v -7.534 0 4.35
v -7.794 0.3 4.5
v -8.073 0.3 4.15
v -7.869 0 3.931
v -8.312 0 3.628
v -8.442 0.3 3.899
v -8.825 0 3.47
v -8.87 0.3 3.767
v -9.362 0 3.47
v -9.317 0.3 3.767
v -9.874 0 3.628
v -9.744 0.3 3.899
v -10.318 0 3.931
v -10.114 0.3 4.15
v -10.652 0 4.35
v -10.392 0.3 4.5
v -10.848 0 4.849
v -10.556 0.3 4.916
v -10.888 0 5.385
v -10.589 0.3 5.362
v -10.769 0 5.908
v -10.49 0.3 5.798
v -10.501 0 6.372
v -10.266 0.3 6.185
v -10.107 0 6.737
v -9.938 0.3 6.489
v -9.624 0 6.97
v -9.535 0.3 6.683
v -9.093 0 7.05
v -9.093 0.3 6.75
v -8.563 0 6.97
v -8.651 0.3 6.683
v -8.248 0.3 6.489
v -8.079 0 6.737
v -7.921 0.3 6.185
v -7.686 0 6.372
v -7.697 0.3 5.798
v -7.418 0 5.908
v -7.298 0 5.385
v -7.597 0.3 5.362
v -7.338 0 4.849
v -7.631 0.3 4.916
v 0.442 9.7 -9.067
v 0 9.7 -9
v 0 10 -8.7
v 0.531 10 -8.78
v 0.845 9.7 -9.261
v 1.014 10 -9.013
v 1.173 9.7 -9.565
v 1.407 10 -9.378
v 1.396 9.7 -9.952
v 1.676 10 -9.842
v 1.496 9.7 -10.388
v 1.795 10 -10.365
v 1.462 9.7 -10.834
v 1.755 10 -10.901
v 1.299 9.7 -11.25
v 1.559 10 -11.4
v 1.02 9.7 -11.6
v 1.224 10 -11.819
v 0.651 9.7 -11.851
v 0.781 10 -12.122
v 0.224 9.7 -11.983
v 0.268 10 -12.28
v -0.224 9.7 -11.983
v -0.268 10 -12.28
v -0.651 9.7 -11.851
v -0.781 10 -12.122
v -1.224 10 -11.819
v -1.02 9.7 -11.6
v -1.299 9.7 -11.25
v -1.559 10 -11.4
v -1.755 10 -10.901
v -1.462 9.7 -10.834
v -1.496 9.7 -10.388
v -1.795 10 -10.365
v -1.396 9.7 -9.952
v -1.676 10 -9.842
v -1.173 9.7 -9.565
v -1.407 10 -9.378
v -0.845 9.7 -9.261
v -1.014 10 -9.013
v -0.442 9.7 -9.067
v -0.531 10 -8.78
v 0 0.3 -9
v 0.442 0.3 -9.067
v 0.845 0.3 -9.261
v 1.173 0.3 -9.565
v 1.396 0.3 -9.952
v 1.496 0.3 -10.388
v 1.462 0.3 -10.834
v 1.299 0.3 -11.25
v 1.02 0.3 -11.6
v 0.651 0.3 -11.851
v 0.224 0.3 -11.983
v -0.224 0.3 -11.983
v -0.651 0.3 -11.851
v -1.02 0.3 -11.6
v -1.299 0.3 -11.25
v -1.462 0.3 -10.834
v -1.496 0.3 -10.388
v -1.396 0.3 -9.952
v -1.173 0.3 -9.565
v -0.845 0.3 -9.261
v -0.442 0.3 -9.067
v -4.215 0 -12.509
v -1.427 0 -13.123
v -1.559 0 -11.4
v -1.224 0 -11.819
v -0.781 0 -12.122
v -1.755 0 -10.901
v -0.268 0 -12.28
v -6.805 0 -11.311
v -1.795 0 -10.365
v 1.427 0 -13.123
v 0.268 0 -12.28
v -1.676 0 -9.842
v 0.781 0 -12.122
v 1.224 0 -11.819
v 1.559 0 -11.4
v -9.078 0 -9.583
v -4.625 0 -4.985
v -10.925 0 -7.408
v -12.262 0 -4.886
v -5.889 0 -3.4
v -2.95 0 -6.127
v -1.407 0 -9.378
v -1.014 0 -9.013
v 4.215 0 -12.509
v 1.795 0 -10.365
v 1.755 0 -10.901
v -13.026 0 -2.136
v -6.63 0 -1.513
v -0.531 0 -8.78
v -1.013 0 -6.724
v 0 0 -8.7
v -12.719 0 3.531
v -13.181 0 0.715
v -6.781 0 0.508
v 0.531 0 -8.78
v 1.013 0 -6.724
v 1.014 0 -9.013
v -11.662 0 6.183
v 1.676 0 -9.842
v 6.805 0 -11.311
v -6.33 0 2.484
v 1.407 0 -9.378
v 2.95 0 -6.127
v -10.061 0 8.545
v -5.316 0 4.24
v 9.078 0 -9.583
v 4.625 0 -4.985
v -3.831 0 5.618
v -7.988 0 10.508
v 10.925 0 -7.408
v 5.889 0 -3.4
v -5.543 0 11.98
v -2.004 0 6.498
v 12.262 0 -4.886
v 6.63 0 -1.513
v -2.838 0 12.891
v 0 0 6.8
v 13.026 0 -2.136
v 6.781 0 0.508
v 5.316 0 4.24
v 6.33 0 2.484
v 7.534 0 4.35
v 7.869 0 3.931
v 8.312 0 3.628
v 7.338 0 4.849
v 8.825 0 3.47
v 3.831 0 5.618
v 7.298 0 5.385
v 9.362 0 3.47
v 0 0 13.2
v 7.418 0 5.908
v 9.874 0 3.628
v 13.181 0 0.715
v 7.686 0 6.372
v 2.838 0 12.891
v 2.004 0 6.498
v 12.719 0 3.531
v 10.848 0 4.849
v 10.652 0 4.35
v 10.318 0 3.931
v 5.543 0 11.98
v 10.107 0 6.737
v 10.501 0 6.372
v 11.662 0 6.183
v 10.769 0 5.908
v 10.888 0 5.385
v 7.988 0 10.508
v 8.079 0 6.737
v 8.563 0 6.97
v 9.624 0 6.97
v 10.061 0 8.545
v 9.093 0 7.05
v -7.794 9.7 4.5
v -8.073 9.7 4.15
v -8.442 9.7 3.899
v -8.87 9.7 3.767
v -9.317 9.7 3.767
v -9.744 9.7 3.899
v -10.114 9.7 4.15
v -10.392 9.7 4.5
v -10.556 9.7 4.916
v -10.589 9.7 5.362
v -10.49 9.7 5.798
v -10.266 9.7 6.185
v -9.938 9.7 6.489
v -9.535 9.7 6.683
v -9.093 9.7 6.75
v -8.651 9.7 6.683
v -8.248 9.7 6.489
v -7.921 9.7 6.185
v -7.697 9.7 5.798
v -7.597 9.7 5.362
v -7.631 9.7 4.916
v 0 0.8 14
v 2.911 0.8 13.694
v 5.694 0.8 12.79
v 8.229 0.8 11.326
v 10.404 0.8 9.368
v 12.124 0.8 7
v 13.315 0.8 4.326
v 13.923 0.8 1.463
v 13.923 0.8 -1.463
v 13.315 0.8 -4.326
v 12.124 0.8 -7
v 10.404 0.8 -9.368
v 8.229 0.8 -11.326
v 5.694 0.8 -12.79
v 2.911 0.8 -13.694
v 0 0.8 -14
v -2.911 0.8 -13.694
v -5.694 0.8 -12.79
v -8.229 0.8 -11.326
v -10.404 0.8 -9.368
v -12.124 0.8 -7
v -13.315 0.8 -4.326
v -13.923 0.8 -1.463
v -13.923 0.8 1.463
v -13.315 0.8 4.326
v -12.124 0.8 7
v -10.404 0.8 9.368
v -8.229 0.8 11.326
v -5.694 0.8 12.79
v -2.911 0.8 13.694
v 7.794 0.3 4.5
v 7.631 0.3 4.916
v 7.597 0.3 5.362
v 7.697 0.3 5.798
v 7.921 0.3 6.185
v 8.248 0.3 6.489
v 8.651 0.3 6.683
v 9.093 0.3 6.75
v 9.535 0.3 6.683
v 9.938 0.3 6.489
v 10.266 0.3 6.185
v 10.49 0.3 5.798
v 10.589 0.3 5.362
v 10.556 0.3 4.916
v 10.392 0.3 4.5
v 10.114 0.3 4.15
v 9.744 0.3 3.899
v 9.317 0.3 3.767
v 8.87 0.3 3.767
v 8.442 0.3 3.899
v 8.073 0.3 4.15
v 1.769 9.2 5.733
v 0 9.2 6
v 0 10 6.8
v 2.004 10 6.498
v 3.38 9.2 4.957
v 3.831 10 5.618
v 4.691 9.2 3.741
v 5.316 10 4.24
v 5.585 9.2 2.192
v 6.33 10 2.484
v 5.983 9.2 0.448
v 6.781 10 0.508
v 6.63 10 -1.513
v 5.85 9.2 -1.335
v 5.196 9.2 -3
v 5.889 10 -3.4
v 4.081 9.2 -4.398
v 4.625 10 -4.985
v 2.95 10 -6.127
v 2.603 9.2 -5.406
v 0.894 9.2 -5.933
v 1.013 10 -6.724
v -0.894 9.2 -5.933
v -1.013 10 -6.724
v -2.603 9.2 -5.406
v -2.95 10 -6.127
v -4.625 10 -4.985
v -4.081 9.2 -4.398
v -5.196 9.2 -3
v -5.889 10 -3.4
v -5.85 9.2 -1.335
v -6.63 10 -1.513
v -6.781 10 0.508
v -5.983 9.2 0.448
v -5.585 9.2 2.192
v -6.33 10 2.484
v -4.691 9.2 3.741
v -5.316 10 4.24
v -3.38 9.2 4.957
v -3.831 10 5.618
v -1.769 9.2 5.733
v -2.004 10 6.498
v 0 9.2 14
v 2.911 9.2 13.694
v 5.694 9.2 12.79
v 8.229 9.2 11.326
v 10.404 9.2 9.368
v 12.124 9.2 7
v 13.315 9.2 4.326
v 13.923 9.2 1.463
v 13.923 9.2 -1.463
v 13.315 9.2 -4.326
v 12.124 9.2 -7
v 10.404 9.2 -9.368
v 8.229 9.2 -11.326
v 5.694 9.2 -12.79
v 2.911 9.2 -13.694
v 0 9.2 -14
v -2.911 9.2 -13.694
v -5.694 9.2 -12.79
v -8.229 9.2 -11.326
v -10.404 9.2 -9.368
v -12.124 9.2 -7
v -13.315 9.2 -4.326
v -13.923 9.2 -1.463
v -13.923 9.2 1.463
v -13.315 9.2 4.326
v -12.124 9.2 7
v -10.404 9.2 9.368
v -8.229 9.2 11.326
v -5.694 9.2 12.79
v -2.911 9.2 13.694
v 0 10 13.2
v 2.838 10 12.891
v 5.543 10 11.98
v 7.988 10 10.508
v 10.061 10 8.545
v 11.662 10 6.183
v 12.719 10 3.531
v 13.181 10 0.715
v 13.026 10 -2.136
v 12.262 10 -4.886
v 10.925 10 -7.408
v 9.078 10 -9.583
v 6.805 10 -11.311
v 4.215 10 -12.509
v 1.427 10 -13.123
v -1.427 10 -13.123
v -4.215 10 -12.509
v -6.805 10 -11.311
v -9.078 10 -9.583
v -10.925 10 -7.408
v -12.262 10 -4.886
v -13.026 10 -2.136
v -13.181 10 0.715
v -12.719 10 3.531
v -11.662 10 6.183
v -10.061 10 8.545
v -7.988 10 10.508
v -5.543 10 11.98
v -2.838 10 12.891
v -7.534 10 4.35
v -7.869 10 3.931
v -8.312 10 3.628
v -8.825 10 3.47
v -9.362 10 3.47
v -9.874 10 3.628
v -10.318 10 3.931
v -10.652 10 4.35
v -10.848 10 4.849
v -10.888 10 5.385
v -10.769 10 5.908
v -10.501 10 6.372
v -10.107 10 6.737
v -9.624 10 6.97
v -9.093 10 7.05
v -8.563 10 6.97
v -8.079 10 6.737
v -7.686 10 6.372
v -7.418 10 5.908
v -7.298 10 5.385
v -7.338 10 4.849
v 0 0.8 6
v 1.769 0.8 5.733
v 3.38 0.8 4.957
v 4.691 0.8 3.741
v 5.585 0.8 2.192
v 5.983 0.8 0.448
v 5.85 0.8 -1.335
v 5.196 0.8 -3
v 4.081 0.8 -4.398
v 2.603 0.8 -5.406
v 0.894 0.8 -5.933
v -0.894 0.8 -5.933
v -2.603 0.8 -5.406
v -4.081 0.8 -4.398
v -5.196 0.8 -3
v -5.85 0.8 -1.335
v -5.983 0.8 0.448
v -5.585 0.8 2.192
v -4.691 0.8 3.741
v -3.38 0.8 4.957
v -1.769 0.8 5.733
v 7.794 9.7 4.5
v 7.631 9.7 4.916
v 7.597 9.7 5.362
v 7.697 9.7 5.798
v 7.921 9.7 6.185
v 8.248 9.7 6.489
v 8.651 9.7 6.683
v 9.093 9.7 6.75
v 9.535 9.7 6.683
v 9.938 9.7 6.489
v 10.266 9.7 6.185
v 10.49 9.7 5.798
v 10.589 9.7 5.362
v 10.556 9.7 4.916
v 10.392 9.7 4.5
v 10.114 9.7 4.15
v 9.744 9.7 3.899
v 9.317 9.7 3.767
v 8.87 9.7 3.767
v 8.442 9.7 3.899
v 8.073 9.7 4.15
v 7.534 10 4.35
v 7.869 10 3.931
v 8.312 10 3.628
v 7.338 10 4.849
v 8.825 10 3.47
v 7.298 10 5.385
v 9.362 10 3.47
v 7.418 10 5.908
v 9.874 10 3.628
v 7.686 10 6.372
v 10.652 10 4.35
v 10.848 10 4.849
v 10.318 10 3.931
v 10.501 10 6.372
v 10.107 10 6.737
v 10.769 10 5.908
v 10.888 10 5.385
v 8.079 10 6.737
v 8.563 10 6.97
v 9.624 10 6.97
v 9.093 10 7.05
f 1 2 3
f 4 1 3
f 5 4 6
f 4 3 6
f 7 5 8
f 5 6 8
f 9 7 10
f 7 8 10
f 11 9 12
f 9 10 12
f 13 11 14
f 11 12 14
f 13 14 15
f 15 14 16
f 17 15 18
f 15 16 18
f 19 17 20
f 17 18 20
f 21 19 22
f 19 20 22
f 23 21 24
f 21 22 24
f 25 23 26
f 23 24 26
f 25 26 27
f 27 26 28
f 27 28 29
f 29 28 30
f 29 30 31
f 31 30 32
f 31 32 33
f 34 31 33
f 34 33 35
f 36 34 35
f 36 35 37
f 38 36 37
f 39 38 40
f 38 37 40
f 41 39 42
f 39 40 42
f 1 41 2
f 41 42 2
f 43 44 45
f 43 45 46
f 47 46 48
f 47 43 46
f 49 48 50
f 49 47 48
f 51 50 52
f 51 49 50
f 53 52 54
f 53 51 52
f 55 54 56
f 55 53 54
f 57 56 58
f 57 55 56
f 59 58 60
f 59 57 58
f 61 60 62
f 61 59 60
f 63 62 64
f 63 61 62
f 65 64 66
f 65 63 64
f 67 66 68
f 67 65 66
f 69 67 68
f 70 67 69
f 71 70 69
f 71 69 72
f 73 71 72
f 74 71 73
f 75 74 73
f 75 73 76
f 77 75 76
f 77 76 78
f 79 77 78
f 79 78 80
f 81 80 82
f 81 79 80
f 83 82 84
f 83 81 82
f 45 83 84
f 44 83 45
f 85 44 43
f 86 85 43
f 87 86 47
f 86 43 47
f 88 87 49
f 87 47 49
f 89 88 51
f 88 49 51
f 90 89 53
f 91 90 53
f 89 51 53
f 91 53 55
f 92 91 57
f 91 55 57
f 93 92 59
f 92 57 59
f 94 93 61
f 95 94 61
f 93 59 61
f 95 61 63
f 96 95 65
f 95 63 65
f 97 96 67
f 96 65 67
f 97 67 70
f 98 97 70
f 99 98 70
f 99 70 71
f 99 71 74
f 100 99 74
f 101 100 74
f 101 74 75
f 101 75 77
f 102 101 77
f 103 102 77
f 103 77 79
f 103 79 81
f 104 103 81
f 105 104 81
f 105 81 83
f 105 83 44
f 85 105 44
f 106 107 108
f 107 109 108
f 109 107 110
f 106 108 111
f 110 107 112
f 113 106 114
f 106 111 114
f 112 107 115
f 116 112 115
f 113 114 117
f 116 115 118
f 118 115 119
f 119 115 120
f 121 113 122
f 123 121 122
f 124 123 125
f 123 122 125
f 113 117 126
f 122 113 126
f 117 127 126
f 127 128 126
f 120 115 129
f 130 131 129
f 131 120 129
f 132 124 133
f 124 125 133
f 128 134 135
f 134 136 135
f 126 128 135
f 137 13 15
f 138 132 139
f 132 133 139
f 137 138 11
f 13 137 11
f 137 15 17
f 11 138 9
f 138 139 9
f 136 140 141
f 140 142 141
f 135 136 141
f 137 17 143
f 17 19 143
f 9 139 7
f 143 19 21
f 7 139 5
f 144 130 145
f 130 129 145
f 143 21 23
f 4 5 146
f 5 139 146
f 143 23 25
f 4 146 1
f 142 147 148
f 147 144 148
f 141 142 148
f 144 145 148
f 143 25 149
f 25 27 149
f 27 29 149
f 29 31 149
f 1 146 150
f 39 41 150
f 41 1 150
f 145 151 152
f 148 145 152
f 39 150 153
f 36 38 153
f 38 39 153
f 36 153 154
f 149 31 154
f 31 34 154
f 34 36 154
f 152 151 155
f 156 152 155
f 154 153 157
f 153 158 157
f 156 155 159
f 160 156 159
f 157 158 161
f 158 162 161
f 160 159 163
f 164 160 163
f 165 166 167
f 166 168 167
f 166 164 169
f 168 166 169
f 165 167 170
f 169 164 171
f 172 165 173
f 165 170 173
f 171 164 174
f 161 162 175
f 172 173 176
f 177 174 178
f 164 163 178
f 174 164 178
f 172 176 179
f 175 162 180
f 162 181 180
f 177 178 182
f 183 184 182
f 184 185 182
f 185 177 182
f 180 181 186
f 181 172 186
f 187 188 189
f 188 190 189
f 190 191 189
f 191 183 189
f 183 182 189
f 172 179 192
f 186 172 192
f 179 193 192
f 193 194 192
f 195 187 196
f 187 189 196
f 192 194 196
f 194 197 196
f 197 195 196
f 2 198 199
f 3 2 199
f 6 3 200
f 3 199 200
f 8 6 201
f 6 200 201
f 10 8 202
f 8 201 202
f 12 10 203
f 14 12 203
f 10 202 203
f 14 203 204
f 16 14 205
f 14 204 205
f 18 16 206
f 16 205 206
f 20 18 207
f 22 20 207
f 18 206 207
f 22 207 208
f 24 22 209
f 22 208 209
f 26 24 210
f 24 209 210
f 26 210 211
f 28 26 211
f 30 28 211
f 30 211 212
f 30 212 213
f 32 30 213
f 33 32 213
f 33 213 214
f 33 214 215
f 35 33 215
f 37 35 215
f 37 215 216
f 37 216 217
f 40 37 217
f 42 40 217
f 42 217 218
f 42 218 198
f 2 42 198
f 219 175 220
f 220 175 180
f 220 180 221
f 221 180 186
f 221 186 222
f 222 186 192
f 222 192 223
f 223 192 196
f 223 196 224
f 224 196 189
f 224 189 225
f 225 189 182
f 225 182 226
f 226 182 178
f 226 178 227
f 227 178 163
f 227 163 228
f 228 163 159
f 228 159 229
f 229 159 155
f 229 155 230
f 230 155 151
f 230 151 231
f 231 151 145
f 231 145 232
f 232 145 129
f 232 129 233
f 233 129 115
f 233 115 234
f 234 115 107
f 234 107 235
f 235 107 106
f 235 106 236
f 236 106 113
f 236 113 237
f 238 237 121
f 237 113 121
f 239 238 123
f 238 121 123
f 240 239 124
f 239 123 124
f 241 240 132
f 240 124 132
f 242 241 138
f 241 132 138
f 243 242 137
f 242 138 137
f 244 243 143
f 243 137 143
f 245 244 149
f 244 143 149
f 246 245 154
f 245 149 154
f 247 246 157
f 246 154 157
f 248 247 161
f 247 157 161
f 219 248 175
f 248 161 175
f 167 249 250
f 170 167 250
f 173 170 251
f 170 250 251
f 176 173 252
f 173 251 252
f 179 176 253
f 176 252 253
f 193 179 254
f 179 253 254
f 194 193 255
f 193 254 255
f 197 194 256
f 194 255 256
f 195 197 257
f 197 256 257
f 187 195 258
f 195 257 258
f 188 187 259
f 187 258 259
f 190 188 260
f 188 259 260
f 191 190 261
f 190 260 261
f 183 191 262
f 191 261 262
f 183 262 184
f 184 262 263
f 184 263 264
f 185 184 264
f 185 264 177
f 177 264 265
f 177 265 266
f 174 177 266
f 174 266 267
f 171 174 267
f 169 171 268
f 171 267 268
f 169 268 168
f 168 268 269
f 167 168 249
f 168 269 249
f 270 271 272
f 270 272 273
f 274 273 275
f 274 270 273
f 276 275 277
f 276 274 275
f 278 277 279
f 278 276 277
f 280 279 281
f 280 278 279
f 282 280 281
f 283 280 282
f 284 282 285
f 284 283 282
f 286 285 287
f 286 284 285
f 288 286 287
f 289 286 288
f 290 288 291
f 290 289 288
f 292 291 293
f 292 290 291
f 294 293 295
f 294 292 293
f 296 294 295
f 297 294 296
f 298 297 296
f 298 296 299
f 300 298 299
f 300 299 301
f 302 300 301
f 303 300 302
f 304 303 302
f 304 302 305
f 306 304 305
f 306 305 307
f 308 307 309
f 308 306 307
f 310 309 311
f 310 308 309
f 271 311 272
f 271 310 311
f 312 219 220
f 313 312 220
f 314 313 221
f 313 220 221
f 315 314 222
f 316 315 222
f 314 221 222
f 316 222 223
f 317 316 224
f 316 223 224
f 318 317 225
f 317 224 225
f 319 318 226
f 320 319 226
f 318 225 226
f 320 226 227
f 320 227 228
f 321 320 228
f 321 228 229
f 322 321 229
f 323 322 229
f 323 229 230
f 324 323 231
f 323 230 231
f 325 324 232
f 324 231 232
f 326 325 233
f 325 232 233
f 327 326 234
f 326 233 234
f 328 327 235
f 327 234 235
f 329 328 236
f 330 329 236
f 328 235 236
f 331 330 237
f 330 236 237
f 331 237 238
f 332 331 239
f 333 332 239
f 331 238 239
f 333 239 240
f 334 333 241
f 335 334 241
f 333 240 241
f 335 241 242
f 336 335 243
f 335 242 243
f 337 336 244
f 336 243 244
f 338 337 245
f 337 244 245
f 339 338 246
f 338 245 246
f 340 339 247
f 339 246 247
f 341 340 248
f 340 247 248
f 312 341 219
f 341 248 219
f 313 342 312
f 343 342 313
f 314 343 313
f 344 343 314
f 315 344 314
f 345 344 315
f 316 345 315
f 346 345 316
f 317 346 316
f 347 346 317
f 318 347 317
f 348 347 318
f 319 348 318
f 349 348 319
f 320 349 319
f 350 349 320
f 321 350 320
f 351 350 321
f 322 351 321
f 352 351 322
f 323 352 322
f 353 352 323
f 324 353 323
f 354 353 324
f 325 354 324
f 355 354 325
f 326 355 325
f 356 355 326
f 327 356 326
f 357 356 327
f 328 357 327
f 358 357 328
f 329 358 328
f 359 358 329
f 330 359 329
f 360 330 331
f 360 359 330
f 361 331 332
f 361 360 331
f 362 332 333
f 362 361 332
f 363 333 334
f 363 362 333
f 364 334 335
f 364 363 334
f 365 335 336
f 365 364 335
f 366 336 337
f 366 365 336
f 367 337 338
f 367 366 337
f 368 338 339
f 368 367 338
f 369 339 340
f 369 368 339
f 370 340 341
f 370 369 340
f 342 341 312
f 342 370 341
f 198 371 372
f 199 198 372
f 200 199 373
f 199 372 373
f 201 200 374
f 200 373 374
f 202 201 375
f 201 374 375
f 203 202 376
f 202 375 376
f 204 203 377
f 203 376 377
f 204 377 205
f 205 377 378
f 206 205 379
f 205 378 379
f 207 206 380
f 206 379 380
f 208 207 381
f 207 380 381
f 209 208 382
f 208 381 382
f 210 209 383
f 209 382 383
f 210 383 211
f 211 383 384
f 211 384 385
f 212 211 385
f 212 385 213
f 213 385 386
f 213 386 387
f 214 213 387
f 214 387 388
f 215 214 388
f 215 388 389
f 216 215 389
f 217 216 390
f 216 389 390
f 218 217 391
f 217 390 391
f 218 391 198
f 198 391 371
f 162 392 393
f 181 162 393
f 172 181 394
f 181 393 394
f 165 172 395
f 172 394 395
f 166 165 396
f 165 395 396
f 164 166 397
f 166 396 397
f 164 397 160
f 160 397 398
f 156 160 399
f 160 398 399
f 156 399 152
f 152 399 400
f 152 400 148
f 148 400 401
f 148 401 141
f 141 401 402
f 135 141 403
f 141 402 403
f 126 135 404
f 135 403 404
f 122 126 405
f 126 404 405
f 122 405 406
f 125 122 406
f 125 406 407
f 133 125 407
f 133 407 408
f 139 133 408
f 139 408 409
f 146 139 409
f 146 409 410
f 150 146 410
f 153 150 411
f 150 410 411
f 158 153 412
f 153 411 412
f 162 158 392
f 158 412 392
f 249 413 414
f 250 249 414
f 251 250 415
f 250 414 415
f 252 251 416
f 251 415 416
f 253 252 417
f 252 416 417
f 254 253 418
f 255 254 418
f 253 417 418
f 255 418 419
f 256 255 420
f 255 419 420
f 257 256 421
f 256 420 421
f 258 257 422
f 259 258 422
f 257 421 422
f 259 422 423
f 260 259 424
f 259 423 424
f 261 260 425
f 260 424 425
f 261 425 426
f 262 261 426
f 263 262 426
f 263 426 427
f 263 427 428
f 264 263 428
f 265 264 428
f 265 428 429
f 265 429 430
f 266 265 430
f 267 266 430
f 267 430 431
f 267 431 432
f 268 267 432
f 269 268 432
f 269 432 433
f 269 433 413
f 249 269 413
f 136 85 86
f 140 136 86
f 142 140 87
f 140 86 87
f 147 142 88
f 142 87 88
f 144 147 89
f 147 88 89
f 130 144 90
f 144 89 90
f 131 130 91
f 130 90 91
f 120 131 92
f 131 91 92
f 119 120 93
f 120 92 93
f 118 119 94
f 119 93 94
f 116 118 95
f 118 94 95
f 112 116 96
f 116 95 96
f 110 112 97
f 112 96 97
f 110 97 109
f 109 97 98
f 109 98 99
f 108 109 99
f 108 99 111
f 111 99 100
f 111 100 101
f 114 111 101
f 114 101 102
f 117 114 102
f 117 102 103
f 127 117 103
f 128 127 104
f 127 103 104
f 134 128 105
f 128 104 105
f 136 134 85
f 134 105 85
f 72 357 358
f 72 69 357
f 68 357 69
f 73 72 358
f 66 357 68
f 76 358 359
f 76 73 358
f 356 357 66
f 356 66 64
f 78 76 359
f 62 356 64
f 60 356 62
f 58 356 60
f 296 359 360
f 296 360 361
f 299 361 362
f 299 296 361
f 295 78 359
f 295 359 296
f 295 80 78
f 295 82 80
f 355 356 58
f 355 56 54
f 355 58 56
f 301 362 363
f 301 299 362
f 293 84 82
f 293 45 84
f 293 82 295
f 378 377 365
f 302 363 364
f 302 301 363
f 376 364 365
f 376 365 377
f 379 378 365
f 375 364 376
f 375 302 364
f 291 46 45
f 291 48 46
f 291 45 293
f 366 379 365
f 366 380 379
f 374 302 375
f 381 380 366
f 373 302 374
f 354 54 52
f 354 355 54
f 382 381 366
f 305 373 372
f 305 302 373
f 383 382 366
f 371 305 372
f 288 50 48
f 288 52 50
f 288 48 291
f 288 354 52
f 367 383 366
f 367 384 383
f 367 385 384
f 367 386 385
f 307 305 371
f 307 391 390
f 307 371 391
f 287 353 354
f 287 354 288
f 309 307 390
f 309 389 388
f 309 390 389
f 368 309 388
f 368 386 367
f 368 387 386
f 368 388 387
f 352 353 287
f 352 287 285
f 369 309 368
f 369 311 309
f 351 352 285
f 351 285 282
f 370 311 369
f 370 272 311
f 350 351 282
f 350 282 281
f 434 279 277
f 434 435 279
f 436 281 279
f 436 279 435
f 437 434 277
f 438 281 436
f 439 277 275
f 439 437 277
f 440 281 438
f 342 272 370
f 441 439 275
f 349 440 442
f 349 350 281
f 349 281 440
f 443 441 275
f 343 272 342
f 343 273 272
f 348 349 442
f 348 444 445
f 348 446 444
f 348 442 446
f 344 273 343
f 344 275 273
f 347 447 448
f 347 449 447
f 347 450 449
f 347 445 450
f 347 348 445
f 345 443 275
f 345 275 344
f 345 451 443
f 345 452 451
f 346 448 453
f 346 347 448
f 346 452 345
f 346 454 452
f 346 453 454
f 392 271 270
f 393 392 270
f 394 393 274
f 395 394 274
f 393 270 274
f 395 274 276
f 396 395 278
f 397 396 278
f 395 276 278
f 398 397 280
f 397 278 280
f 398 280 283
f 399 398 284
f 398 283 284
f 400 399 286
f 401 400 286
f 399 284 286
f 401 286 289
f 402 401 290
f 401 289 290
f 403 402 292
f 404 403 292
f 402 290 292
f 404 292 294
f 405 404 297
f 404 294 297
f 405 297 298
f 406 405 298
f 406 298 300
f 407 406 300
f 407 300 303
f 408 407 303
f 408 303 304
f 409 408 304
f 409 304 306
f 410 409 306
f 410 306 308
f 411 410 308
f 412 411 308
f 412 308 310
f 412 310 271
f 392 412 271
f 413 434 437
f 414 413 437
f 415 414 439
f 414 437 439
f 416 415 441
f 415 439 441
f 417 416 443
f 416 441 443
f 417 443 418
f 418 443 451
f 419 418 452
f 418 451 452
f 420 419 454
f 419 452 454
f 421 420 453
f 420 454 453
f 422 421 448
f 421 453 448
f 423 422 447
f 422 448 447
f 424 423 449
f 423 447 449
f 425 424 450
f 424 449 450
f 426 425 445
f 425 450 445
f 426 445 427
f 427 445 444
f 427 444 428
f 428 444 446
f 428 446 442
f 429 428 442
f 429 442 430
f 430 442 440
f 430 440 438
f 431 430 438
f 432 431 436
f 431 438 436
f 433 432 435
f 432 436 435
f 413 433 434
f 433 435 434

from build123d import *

# Parameters (mm, degrees)
SKETCH1_R                    = 14
BOSS_EXTRUDE1_DEPTH          = 10
SKETCH2_R                    = 6
CUT_EXTRUDE1_DEPTH           = 23.181073013
SKETCH3_R                    = 1.5
CUT_EXTRUDE2_DEPTH           = 23.181073013
CHAMFER1_SIZE                = 0.8
CHAMFER2_SIZE                = 0.3
CIRPATTERN1_COUNT            = 3
CHAMFER2_OF_CIRPATTERN1_SIZE = 0.3


with BuildPart() as part:
    # Sketch1 → Boss-Extrude1 (new body)
    with BuildSketch(Plane(origin=(0, 0, 0), x_dir=(1, 0, 0), z_dir=(0, 1, 0))):
        with Locations(Location((0, 0, 0), (0, 0, 270))):
            Circle(SKETCH1_R)
    extrude(amount=BOSS_EXTRUDE1_DEPTH)

    # Sketch2 → Cut-Extrude1 (cut, through all)
    with BuildSketch(Plane(origin=(0, 10, 0), x_dir=(1, 0, 0), z_dir=(0, 1, 0))):
        with Locations(Location((0, 0, 0), (0, 0, 270))):
            Circle(SKETCH2_R)
    extrude(amount=-CUT_EXTRUDE1_DEPTH, mode=Mode.SUBTRACT)

    # Sketch3 → Cut-Extrude2 (cut, through all)
    with BuildSketch(Plane(origin=(0, 10, 0), x_dir=(1, 0, 0), z_dir=(0, 1, 0))):
        with Locations(Location((0, 10.5, 0), (0, 0, 270))):
            Circle(SKETCH3_R)
    cut_extrude2 = extrude(amount=-CUT_EXTRUDE2_DEPTH, mode=Mode.SUBTRACT)

    # Chamfer1
    chamfer1_edges = [part.edges().sort_by_distance(p)[0] for p in [
        (0, 0, -14),
        (0, 10, -14),
        (0, 0, -6),
        (0, 10, -6),
    ]]
    chamfer(chamfer1_edges, length=CHAMFER1_SIZE)

    # Chamfer2
    chamfer2_edges = [part.edges().sort_by_distance(p)[0] for p in [
        (0, 0, -12),
        (0, 10, -12),
    ]]
    chamfer(chamfer2_edges, length=CHAMFER2_SIZE)

    # CirPattern1: Cut-Extrude2 ×3 about axis
    cirpattern1_axis = Axis((0, 0, 0), (0, 1, 0))
    for i in range(1, CIRPATTERN1_COUNT):
        add(cut_extrude2.rotate(cirpattern1_axis, i * 360 / CIRPATTERN1_COUNT), mode=Mode.SUBTRACT)

    # Chamfer2 of CirPattern1
    chamfer2_of_cirpattern1_edges = [part.edges().sort_by_distance(p)[0] for p in [
        (-10.392304845, 0, 6),
        (-10.392304845, 10, 6),
        (10.392304845, 0, 6),
        (10.392304845, 10, 6),
    ]]
    chamfer(chamfer2_of_cirpattern1_edges, length=CHAMFER2_OF_CIRPATTERN1_SIZE)


solid = part.part
